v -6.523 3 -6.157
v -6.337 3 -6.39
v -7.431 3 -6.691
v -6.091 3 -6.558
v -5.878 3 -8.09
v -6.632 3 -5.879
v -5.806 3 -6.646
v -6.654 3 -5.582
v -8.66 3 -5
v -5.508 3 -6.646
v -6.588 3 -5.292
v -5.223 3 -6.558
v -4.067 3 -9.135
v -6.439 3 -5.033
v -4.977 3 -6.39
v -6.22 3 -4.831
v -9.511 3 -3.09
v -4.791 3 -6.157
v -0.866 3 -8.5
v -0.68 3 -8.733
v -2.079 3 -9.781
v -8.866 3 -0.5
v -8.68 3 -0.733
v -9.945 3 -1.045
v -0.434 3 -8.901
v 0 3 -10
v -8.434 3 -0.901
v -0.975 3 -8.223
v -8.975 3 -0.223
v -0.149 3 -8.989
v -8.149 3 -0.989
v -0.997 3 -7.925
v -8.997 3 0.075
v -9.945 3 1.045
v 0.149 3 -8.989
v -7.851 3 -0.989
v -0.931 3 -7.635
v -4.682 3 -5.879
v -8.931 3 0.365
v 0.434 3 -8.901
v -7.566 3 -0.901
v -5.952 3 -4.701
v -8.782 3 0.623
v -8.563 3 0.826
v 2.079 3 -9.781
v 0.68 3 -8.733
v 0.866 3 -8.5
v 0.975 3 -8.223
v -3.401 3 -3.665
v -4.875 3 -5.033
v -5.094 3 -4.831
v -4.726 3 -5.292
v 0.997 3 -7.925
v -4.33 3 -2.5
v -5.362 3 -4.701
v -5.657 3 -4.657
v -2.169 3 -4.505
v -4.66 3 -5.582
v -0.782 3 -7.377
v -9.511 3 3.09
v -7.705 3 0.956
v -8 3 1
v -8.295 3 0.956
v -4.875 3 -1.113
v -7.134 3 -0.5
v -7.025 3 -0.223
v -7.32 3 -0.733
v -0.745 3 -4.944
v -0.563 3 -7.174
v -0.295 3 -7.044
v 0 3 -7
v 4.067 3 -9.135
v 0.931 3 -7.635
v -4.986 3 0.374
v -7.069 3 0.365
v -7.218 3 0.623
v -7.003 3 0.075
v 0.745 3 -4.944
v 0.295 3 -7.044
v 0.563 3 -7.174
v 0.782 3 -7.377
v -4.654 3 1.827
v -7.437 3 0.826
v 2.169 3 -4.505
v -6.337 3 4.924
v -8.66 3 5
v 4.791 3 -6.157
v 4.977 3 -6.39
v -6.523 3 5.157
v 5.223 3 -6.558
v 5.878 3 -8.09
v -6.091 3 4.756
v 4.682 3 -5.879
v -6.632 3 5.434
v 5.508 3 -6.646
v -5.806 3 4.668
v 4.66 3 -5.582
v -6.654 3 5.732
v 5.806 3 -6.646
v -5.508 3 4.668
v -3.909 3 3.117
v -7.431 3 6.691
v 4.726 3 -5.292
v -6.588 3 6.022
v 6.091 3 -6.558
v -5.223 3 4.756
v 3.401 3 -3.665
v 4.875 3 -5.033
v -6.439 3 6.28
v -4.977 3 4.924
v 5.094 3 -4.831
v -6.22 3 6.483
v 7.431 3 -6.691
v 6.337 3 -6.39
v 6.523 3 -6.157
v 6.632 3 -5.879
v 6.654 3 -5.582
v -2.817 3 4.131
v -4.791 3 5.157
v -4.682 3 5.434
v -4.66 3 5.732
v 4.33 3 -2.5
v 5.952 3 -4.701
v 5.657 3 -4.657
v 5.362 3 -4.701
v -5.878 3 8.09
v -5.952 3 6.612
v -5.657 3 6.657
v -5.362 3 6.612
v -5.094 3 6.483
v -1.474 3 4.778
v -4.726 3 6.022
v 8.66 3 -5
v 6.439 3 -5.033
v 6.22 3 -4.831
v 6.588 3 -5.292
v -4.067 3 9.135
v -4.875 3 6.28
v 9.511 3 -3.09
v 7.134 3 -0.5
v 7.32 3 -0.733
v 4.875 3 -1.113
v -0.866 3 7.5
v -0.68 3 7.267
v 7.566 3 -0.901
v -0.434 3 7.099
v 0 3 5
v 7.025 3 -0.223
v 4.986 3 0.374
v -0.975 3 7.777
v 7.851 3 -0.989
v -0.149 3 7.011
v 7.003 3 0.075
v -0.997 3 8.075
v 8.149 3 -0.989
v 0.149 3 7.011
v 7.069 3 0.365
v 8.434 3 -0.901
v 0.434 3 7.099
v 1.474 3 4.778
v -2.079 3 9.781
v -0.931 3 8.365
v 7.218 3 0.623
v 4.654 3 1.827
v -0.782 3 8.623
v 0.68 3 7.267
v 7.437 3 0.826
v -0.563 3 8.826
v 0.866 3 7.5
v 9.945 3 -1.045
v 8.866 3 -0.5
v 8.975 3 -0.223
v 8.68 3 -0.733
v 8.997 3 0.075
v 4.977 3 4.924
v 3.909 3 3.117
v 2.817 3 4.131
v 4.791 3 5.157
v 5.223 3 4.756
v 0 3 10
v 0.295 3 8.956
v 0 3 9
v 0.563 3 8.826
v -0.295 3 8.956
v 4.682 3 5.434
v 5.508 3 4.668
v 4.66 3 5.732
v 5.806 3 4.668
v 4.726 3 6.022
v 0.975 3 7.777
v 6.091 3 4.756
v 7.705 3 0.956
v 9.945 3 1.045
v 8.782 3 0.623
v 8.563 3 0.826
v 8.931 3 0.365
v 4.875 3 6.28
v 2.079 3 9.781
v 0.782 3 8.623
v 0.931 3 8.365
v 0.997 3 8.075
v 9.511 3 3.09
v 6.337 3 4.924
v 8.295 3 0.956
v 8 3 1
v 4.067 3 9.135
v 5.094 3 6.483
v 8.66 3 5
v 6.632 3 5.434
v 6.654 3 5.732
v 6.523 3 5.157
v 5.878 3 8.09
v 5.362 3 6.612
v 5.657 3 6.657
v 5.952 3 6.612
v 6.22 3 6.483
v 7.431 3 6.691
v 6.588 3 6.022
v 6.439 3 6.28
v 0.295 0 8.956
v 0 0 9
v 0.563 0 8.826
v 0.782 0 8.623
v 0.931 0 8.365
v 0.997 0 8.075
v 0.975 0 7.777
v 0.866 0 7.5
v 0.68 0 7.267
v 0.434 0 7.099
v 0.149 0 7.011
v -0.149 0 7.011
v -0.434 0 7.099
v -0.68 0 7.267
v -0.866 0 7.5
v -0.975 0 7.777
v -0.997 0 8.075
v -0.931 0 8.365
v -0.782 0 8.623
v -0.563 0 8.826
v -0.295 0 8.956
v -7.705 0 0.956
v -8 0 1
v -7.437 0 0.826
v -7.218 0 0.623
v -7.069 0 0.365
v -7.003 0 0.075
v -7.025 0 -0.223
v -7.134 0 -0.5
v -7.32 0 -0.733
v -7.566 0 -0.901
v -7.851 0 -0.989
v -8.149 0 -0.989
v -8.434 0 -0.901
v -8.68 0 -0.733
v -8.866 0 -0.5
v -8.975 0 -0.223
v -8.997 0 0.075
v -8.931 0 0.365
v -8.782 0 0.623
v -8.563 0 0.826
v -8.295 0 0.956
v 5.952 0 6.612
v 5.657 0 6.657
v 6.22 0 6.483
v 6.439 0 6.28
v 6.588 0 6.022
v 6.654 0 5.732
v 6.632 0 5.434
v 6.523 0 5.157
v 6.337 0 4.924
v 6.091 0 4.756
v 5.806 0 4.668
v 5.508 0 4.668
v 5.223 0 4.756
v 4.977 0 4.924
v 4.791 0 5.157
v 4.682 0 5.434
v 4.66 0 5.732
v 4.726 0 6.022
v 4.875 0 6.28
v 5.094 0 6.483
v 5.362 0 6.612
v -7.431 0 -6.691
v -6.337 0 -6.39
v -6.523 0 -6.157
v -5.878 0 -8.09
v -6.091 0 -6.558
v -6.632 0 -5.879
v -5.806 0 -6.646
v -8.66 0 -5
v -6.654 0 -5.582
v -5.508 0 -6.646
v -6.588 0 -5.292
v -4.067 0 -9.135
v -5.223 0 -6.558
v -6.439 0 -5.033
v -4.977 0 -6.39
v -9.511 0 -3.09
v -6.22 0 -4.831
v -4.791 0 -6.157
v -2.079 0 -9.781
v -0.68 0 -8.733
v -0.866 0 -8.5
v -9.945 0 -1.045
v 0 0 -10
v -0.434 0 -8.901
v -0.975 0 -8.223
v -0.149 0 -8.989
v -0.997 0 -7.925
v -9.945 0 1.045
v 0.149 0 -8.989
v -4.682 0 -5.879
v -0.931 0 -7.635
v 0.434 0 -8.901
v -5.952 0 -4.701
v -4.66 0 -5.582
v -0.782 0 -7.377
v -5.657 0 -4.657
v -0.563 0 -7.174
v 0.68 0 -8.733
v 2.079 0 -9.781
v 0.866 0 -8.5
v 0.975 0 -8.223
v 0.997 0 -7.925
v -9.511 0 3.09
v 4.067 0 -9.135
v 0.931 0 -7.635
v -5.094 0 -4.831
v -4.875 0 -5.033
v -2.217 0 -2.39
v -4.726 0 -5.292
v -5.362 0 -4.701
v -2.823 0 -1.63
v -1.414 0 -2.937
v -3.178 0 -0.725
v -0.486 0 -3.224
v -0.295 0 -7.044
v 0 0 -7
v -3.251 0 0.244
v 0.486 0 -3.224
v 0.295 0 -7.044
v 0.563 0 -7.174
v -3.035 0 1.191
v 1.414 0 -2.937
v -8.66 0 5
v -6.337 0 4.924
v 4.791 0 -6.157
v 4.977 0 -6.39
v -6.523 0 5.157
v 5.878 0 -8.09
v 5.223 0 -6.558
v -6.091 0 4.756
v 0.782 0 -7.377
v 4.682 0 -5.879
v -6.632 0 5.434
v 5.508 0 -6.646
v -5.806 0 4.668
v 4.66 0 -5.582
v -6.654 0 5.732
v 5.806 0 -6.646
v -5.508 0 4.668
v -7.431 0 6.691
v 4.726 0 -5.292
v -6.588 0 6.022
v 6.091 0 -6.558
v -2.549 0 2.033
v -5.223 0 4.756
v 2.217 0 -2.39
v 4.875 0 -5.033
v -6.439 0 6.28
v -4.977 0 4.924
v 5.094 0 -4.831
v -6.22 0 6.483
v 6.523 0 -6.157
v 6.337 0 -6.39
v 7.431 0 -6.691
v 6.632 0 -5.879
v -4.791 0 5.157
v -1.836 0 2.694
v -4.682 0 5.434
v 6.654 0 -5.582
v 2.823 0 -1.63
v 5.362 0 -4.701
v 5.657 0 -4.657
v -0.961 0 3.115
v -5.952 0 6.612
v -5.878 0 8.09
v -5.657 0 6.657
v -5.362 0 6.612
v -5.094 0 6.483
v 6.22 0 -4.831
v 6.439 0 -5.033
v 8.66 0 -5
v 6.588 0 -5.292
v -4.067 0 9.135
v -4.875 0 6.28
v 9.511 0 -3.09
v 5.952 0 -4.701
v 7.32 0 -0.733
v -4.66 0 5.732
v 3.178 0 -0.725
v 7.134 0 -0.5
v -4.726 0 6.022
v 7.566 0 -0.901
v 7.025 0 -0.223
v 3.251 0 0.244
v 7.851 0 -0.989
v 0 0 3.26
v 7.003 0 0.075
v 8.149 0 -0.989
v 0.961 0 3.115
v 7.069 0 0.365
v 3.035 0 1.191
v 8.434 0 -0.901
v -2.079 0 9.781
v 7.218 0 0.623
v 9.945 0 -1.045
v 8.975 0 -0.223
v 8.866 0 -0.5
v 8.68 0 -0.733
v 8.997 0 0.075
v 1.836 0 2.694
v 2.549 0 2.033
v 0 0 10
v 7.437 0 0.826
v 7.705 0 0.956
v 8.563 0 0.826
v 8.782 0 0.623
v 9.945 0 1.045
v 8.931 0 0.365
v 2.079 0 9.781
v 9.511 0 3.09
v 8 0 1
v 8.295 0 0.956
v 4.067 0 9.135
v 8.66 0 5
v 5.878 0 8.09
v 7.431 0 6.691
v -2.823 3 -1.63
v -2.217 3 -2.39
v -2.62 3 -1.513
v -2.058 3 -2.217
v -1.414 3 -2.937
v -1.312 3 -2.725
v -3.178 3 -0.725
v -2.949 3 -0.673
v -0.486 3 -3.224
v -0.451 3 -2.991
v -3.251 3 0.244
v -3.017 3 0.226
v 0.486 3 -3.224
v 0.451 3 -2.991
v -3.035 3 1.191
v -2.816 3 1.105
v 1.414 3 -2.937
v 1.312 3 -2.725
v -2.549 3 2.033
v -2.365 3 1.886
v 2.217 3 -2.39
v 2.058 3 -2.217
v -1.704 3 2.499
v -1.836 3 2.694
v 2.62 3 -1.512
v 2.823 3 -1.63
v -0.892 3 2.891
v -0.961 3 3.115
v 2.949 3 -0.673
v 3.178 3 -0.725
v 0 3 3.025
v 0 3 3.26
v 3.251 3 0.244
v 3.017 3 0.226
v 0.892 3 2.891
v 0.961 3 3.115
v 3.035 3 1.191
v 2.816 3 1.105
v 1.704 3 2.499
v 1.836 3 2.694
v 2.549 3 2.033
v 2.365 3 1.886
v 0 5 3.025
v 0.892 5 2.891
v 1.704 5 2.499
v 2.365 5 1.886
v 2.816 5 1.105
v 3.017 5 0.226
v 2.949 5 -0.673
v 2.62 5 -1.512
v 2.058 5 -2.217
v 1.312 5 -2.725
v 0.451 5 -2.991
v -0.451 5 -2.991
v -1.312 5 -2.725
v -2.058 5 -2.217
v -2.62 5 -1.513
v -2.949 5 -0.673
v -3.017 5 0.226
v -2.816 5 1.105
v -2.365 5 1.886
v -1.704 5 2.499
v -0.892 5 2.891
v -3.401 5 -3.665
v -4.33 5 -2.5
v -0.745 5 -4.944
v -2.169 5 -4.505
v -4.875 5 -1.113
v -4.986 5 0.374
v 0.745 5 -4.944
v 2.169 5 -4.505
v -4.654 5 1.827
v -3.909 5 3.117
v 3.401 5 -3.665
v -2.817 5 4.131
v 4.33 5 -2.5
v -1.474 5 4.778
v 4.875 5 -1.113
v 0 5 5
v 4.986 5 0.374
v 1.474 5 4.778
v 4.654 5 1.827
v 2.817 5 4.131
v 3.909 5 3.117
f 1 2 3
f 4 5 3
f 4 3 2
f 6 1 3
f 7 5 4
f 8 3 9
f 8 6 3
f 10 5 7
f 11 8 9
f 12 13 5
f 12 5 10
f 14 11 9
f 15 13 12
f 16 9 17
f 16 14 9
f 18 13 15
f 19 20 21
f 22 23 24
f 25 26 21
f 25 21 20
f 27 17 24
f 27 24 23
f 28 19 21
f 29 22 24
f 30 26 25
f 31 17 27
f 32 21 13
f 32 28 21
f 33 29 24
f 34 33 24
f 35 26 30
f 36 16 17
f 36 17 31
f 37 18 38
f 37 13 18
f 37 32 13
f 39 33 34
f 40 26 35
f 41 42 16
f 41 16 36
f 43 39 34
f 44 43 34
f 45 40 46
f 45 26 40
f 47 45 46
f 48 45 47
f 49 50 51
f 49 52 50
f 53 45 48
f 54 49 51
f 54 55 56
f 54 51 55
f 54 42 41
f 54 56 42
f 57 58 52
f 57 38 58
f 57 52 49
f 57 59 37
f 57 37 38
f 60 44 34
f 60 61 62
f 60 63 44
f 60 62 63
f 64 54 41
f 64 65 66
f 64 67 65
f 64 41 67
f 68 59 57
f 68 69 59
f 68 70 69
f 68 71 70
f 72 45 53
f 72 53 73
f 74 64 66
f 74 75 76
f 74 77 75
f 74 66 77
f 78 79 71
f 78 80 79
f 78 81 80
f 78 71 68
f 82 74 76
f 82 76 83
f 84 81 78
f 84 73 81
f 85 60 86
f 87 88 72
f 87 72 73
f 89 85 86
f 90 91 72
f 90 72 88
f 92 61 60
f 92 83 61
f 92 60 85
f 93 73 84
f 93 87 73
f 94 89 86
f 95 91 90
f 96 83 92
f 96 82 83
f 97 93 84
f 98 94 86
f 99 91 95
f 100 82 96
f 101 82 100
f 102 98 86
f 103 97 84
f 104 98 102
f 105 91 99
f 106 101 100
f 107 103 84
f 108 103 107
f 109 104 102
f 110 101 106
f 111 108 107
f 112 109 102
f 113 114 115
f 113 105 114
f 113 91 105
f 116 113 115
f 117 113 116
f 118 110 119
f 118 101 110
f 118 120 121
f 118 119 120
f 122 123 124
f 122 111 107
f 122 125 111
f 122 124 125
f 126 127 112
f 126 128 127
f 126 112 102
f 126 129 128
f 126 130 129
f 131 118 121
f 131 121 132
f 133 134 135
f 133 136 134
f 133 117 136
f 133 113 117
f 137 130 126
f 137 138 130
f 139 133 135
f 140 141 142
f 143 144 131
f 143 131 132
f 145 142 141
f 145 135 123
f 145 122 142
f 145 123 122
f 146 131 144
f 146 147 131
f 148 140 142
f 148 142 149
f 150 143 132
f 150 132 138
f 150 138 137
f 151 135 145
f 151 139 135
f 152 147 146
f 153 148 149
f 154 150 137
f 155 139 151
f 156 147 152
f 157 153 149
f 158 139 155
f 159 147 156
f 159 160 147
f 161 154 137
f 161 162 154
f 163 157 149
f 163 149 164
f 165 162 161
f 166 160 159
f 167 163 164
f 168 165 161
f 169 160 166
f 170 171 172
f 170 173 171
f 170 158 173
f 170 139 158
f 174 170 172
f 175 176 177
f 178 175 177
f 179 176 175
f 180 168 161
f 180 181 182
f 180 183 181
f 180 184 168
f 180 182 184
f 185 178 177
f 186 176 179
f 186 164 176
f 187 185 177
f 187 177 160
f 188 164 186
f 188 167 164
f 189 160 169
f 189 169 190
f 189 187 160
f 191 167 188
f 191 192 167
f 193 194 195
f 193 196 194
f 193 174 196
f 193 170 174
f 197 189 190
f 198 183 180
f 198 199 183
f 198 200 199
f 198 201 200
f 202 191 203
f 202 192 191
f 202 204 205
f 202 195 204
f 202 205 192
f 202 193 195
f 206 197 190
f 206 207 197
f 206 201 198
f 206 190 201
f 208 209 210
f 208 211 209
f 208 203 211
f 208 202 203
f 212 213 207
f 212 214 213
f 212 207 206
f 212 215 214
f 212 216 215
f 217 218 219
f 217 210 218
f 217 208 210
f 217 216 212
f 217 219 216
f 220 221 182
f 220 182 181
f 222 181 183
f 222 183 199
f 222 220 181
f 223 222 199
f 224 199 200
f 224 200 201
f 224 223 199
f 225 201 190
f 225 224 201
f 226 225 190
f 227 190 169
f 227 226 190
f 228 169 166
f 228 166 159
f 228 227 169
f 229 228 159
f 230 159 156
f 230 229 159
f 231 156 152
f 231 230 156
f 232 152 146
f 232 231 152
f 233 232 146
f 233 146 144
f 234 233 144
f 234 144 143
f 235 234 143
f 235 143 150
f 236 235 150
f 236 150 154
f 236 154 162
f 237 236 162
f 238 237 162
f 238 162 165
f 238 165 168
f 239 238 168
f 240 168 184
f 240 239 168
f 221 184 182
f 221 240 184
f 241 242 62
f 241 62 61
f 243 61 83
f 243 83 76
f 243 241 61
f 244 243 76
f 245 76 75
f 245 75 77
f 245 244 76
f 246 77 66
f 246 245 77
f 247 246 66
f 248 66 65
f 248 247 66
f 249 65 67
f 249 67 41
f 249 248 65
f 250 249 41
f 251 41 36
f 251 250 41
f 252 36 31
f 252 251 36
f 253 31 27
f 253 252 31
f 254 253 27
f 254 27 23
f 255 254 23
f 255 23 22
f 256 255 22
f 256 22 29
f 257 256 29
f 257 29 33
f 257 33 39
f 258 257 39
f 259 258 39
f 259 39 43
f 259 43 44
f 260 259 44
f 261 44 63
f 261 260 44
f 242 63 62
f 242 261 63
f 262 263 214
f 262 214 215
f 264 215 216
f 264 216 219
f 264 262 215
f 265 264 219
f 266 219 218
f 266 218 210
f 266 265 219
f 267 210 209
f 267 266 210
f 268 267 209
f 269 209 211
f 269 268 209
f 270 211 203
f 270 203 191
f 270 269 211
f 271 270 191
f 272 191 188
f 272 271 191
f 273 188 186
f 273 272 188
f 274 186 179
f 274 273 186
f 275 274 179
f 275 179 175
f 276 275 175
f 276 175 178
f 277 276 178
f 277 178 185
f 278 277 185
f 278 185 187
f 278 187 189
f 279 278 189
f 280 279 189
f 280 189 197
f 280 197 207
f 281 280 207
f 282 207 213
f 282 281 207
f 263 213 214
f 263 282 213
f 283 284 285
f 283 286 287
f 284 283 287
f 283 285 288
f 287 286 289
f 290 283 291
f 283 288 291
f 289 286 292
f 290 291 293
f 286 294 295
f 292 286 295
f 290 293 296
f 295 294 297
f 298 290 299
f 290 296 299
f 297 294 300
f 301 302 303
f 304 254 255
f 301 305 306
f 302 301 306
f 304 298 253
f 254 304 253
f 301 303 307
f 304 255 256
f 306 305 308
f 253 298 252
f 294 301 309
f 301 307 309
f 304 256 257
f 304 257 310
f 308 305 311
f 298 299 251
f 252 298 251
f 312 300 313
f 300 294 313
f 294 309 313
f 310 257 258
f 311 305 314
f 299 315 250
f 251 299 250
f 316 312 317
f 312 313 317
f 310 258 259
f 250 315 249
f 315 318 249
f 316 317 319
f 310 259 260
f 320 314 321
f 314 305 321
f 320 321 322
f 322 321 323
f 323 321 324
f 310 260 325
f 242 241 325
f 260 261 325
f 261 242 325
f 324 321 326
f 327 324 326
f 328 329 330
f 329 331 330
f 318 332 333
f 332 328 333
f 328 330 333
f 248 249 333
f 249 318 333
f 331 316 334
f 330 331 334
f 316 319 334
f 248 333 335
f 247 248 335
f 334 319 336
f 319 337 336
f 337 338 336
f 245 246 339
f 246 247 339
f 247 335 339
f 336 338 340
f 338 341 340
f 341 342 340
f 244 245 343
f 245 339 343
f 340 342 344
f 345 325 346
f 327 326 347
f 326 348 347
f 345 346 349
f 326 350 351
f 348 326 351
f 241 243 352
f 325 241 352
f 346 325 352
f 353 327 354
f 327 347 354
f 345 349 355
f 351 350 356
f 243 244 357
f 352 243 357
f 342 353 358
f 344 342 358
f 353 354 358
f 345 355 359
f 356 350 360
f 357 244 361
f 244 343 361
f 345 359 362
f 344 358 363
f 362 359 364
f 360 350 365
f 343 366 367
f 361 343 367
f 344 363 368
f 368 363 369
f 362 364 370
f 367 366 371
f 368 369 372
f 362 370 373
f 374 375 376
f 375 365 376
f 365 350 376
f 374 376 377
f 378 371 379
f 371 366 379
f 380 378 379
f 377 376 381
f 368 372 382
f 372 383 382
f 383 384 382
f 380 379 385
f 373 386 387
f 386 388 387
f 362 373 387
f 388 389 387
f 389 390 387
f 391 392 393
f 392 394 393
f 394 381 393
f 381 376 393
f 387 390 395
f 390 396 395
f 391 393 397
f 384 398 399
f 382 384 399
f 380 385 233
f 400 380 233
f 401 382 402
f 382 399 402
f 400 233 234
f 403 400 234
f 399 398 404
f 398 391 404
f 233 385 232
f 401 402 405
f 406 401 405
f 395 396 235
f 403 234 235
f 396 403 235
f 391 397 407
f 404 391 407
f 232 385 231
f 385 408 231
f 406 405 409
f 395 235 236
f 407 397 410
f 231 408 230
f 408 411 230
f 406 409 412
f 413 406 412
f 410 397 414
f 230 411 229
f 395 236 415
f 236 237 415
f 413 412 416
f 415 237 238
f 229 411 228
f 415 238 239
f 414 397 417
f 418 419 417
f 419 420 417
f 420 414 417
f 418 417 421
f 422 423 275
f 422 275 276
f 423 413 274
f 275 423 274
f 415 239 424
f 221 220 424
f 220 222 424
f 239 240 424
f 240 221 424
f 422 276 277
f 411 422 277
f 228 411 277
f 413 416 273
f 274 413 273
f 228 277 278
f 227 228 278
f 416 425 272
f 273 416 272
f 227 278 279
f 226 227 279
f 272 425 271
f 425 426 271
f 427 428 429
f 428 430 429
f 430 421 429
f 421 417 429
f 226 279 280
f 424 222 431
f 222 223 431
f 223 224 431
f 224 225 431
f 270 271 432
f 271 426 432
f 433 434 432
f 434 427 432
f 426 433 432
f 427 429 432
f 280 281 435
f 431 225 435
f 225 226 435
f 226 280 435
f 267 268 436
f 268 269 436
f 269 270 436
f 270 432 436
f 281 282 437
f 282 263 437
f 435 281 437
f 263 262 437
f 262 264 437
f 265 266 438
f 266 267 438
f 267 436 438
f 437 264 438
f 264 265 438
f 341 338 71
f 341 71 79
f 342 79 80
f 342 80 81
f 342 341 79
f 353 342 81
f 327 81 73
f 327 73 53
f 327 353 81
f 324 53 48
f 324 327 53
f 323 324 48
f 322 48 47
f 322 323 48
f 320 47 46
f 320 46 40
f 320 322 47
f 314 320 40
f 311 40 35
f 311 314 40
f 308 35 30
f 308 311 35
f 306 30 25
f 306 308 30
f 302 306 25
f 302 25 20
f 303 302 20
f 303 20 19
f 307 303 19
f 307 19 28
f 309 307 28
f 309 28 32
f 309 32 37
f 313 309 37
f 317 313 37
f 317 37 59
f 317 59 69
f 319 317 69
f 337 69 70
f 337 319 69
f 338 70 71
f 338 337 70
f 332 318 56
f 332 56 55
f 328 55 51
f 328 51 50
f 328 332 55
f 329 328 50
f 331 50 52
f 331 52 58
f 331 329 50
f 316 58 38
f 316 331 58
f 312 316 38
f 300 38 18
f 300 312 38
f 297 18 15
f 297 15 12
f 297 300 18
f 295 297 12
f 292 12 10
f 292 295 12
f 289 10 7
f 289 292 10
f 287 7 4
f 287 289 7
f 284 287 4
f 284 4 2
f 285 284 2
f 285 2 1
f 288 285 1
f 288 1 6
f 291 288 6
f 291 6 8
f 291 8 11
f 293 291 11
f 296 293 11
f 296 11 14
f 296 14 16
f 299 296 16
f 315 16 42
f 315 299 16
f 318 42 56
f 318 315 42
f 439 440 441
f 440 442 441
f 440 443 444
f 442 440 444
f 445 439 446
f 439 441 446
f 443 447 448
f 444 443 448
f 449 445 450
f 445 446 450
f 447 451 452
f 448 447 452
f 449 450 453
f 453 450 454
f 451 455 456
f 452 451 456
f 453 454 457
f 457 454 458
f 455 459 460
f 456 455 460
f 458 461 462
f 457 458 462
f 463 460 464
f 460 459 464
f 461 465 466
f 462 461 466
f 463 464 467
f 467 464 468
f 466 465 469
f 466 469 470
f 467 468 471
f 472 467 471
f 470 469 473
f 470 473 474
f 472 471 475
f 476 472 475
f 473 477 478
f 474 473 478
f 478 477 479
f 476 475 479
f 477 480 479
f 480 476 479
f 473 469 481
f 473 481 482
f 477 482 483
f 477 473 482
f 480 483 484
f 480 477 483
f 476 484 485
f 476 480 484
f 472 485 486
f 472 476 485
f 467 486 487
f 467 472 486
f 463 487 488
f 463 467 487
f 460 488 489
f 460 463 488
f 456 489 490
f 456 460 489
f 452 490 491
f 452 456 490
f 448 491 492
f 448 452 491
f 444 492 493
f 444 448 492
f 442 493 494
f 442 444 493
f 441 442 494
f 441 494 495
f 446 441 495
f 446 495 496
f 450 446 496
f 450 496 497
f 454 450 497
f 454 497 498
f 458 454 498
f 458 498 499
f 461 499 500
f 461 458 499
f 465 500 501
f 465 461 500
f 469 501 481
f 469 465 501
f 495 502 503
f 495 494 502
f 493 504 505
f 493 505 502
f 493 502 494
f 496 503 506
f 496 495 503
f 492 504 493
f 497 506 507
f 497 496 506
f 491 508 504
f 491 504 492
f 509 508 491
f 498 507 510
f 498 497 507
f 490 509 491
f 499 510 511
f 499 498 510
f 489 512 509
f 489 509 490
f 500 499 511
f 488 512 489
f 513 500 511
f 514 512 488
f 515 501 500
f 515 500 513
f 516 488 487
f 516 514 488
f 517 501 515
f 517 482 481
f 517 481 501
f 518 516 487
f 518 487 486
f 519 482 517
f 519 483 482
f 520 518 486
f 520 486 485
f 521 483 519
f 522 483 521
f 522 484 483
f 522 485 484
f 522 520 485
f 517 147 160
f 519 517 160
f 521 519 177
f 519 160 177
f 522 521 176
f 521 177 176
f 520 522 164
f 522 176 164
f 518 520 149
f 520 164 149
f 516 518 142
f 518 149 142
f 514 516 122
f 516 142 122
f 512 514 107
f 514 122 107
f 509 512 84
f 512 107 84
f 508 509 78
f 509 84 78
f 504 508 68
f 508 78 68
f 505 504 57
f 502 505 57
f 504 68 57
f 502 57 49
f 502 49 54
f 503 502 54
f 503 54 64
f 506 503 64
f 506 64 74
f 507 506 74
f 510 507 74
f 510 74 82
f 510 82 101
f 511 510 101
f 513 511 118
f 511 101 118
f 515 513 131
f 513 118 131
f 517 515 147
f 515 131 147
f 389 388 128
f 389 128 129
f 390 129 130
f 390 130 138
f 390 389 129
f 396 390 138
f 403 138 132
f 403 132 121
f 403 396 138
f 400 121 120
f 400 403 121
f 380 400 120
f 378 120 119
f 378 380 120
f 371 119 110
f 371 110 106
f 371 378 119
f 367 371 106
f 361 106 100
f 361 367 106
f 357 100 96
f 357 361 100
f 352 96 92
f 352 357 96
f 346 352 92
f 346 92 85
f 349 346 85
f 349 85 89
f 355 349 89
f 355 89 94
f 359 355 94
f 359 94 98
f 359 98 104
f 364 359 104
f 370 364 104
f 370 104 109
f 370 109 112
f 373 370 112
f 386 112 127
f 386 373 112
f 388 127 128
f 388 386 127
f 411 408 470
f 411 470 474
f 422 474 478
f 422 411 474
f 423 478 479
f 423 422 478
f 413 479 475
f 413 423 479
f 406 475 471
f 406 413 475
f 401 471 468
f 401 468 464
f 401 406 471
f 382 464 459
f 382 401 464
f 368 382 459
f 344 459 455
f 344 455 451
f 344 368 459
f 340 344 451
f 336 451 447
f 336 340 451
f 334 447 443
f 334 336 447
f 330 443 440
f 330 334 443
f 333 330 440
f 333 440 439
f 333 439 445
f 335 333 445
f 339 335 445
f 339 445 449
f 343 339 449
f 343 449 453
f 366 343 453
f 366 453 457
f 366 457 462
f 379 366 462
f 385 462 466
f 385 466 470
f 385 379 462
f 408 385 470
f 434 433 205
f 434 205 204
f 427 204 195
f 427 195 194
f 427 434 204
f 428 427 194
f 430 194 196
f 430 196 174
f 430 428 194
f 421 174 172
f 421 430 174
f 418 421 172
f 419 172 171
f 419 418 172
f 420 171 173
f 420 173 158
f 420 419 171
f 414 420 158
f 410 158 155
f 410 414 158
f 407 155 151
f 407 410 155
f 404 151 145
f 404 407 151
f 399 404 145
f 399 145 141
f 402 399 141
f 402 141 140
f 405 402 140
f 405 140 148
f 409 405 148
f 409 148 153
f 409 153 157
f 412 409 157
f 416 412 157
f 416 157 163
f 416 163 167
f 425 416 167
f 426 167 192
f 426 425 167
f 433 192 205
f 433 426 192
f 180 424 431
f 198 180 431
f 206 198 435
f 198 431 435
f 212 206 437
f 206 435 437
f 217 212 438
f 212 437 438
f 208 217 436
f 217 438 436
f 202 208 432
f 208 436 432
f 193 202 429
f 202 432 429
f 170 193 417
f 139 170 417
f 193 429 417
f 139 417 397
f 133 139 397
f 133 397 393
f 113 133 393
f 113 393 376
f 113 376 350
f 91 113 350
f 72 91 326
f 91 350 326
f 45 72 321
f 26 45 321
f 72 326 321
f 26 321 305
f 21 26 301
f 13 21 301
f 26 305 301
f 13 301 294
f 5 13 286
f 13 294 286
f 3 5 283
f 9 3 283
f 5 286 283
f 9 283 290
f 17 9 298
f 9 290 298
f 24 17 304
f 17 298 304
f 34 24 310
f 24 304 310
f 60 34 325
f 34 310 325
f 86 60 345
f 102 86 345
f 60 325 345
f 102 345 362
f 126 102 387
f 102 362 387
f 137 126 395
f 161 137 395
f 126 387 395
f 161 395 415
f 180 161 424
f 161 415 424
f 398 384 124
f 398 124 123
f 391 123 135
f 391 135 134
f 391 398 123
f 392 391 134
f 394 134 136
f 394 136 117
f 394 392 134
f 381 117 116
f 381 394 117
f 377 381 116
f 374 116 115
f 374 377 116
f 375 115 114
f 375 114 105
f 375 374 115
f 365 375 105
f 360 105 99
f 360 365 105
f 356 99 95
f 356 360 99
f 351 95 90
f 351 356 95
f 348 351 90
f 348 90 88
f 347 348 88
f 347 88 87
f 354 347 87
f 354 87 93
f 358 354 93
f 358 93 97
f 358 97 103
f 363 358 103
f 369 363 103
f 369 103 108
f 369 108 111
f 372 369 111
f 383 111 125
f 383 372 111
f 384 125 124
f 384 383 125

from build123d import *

# Parameters (mm, degrees)
SKETCH_1_R      = 10
SKETCH_1_R_2    = 3.26
SKETCH_1_R_3    = 1
EXTRUDE_1_DEPTH = 3
SKETCH_2_R      = 5
SKETCH_2_R_2    = 3.025
EXTRUDE_2_DEPTH = 2


with BuildPart() as part:
    # 草图1 → 凸台-拉伸1 (new body)
    with BuildSketch(Plane(origin=(0, 0, 0), x_dir=(1, 0, 0), z_dir=(0, 1, 0))):
        with Locations(Location((0, 0, 0), (0, 0, 270))):
            Circle(SKETCH_1_R)
        with Locations(Location((0, 0, 0), (0, 0, 270))):
            Circle(SKETCH_1_R_2, mode=Mode.SUBTRACT)
        with Locations(Location((0, 8, 0), (0, 0, 270))):
            Circle(SKETCH_1_R_3, mode=Mode.SUBTRACT)
        with Locations(Location((5.656854249, 5.656854249, 0), (0, 0, 270))):
            Circle(SKETCH_1_R_3, mode=Mode.SUBTRACT)
        with Locations(Location((8, 0, 0), (0, 0, 270))):
            Circle(SKETCH_1_R_3, mode=Mode.SUBTRACT)
        with Locations(Location((5.656854249, -5.656854249, 0), (0, 0, 270))):
            Circle(SKETCH_1_R_3, mode=Mode.SUBTRACT)
        with Locations(Location((0, -8, 0), (0, 0, 270))):
            Circle(SKETCH_1_R_3, mode=Mode.SUBTRACT)
        with Locations(Location((-5.656854249, -5.656854249, 0), (0, 0, 270))):
            Circle(SKETCH_1_R_3, mode=Mode.SUBTRACT)
        with Locations(Location((-8, 0, 0), (0, 0, 270))):
            Circle(SKETCH_1_R_3, mode=Mode.SUBTRACT)
        with Locations(Location((-5.656854249, 5.656854249, 0), (0, 0, 270))):
            Circle(SKETCH_1_R_3, mode=Mode.SUBTRACT)
    extrude(amount=EXTRUDE_1_DEPTH)

    # 草图2 → 凸台-拉伸2 (add)
    with BuildSketch(Plane(origin=(0, 3, 0), x_dir=(1, 0, 0), z_dir=(0, 1, 0))):
        with Locations(Location((0, 0, 0), (0, 0, 270))):
            Circle(SKETCH_2_R)
        with Locations(Location((0, 0, 0), (0, 0, 270))):
            Circle(SKETCH_2_R_2, mode=Mode.SUBTRACT)
    extrude(amount=EXTRUDE_2_DEPTH)


solid = part.part
